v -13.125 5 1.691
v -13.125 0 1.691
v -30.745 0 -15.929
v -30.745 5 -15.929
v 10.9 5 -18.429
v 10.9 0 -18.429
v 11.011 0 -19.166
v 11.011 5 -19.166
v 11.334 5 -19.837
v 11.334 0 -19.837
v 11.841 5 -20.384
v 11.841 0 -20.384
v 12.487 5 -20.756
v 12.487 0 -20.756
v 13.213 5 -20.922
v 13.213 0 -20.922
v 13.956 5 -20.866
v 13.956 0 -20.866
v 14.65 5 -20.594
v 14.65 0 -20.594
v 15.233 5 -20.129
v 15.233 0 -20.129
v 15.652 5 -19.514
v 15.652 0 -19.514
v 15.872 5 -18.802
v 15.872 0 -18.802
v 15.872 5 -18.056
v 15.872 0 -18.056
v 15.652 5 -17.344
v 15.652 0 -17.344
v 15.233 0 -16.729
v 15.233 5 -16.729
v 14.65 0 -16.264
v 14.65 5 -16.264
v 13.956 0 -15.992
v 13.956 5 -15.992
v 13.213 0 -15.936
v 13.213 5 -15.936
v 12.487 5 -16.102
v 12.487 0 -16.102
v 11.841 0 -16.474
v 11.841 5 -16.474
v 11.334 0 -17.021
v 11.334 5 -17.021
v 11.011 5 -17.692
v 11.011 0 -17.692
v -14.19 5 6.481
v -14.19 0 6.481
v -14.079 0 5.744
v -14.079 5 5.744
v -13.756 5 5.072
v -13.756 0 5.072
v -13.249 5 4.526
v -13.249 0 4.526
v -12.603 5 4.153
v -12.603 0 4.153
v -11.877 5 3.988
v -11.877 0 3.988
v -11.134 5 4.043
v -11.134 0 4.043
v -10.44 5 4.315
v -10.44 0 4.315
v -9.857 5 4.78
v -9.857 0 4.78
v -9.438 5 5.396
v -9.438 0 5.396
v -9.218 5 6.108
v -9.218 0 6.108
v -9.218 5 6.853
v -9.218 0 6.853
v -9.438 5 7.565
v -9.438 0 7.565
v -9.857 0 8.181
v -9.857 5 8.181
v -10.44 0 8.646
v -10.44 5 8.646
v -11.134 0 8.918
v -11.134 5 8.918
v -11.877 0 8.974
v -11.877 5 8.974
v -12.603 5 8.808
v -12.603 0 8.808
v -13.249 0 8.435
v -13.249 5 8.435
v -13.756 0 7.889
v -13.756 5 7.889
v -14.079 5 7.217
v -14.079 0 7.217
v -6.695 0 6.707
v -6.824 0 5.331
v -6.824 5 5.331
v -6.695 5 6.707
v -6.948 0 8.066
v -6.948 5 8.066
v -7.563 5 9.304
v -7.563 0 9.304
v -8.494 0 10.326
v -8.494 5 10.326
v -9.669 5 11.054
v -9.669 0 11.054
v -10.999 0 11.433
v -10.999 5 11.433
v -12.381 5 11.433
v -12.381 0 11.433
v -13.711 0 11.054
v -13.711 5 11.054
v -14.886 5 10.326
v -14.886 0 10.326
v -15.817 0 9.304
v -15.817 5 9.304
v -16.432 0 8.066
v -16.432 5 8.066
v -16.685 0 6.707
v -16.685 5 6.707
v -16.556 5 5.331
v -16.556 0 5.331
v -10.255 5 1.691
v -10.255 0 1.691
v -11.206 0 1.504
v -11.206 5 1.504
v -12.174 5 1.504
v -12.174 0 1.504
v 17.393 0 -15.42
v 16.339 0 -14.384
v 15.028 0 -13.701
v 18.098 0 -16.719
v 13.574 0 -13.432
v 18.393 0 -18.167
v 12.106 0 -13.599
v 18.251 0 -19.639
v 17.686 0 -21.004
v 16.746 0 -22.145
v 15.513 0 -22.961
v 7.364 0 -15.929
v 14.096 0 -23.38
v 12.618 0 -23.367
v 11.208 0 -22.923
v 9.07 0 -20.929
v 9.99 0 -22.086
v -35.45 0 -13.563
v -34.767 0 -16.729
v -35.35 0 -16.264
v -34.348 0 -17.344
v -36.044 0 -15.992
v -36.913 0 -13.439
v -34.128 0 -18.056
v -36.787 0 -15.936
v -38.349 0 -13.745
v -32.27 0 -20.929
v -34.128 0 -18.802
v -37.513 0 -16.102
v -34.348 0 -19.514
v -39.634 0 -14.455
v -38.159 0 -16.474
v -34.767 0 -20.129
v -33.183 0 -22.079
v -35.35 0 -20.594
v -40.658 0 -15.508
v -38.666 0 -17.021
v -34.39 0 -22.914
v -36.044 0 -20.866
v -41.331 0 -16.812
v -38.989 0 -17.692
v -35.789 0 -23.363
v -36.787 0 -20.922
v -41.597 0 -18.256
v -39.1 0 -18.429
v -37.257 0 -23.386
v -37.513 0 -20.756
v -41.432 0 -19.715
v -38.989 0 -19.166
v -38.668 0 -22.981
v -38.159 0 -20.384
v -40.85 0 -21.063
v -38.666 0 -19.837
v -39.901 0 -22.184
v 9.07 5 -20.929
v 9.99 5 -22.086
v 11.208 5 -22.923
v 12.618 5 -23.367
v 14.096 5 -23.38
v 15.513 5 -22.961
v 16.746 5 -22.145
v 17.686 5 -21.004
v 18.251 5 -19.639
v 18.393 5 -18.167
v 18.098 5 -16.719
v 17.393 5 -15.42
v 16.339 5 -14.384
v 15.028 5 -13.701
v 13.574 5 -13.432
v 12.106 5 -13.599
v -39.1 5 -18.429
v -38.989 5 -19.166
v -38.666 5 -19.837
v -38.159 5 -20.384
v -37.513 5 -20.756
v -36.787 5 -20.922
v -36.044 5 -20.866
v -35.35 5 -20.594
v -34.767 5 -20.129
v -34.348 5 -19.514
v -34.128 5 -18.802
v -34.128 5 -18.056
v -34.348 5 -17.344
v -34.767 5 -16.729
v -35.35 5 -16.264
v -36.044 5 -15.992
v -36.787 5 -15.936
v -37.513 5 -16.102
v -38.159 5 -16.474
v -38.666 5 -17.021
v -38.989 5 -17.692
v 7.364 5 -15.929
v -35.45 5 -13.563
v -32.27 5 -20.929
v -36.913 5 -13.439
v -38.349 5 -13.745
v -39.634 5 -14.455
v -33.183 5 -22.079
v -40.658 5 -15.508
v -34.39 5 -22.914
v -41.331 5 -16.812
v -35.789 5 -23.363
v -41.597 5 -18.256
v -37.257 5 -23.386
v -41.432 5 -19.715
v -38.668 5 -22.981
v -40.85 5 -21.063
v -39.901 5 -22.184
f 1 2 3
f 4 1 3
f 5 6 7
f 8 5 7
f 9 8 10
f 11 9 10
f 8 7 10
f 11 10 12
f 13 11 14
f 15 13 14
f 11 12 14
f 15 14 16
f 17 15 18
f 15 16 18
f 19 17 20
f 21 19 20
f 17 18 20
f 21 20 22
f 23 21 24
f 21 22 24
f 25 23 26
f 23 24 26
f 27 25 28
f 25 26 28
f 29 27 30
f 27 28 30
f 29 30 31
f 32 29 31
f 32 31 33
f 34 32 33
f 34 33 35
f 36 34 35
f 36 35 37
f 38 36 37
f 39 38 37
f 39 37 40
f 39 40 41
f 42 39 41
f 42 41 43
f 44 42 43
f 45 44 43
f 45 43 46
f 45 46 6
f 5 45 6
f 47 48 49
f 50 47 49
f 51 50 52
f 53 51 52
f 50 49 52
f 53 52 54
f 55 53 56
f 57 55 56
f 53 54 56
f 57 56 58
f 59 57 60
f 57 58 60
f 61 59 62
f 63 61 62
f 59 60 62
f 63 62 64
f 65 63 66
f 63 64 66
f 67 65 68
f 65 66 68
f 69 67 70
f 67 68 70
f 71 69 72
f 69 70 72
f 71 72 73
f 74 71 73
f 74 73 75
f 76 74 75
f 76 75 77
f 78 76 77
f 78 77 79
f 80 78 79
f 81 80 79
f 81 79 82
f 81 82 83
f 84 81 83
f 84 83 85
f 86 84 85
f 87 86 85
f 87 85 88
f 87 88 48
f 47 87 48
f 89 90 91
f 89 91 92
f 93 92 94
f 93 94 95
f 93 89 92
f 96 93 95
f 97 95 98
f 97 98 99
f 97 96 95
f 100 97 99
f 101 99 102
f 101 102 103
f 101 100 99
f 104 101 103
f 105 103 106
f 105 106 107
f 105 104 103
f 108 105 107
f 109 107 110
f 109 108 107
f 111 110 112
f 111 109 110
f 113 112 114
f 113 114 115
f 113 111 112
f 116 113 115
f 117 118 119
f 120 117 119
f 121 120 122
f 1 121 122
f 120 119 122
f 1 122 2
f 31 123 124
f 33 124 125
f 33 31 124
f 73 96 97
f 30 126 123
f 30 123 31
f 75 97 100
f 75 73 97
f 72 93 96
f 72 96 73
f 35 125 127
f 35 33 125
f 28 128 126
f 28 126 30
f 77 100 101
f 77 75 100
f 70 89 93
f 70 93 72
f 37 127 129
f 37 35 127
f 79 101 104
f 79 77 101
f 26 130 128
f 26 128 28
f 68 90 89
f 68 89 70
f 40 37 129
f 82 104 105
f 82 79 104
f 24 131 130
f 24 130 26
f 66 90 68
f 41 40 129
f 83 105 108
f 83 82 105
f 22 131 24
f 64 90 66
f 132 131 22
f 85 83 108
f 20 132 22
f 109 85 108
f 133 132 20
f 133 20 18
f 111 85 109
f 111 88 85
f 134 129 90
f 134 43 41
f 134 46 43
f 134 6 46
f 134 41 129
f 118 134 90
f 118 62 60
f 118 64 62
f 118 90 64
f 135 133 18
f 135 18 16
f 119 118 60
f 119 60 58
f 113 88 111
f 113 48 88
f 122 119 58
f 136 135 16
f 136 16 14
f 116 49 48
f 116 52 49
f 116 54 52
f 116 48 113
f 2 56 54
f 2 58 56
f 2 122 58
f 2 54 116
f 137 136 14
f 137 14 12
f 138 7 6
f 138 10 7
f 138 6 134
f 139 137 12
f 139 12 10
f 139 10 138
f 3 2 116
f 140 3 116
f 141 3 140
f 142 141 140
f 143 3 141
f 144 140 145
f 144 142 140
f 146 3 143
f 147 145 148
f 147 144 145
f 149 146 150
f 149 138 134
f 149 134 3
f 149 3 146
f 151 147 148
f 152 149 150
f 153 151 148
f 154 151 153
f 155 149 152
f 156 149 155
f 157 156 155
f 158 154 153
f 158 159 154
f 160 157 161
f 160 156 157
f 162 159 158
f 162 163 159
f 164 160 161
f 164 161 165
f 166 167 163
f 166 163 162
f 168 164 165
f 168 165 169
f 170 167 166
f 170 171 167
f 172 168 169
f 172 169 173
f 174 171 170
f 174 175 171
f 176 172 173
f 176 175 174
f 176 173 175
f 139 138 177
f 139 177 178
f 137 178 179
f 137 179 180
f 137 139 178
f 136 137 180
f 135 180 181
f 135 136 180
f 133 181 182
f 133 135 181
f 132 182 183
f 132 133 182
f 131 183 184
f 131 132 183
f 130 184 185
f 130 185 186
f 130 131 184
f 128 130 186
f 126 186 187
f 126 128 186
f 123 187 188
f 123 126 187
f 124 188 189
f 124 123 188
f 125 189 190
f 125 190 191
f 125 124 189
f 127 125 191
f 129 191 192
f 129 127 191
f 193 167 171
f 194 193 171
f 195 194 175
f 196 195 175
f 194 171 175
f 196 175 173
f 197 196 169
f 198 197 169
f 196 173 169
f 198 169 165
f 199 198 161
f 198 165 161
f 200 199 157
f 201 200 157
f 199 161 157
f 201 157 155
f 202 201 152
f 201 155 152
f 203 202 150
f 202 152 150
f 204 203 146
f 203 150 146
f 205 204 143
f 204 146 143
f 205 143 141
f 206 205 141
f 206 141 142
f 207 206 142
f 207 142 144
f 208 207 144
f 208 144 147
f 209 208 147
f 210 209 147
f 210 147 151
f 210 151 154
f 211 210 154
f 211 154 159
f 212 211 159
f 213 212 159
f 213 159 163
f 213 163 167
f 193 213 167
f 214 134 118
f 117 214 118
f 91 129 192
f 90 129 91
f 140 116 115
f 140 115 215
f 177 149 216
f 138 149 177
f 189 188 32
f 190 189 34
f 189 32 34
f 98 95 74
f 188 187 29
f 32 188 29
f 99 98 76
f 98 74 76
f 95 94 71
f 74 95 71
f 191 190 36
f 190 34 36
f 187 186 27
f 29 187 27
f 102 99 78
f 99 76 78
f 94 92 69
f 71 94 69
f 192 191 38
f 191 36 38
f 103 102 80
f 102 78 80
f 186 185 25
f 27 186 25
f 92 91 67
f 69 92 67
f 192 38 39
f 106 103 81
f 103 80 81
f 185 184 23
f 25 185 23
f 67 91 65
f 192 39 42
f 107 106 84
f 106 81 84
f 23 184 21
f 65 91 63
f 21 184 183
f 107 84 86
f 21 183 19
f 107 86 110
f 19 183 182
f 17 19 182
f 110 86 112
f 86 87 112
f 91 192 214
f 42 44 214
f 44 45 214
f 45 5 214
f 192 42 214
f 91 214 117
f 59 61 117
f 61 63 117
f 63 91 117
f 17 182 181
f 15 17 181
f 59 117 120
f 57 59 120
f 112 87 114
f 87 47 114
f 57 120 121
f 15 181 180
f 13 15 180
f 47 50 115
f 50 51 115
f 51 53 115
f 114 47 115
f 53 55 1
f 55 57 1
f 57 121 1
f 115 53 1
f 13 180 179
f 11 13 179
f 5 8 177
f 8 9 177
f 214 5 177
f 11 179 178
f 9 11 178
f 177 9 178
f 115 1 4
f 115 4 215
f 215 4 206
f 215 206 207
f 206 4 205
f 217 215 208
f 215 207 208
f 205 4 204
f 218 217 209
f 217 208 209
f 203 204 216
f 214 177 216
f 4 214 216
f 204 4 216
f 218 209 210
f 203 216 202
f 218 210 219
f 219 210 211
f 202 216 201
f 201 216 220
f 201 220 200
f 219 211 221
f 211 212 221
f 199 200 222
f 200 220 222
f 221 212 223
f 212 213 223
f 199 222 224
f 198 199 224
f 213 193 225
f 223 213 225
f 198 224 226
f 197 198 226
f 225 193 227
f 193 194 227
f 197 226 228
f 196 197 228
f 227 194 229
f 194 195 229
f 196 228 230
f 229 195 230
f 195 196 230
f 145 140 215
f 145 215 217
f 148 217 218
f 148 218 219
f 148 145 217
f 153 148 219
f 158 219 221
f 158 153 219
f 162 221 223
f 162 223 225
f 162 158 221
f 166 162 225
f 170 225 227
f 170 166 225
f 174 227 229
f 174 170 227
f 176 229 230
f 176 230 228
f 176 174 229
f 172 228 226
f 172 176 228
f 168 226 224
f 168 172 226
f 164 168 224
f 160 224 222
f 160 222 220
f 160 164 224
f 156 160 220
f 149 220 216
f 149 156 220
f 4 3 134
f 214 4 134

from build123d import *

# Parameters (mm, degrees)
BOSS_EXTRUDE1_DEPTH   = 5
F_5_0MM_DOWEL_HOLE1_D = 5


with BuildPart() as part:
    # Sketch2 → Boss-Extrude1 (new body)
    with BuildSketch(Plane(origin=(0, 0, 0), x_dir=(1, 0, 0), z_dir=(0, 1, 0))):
        with BuildLine():
            Line((-32.269872981, 20.929032067), (9.069872981, 20.929032067))
            ThreePointArc((9.069872981, 20.929032067), (18.019397663, 20.342449229), (12.105904774, 13.599402936))
            Line((12.105904774, 13.599402936), (-6.82412184, -5.330623679))
            ThreePointArc((-6.82412184, -5.330623679), (-11.690092491, -11.4805496), (-16.556063141, -5.330623679))
            Line((-16.556063141, -5.330623679), (-35.449810526, 13.563123706))
            ThreePointArc((-35.449810526, 13.563123706), (-41.190492208, 20.410794235), (-32.269872981, 20.929032067))
        make_face()
        with BuildLine():
            Line((-30.744651075, 15.929032067), (7.364466094, 15.929032067))
            Line((7.364466094, 15.929032067), (-10.255377332, -1.690811359))
            ThreePointArc((-10.255377332, -1.690811359), (-11.690092491, -1.4805496), (-13.124807649, -1.690811359))
            Line((-13.124807649, -1.690811359), (-30.744651075, 15.929032067))
        make_face(mode=Mode.SUBTRACT)
    extrude(amount=BOSS_EXTRUDE1_DEPTH)

    # Ø5.0mm Dowel Hole1 (through all)
    with Locations(Plane(origin=(0, 5, 0), x_dir=(1, 0, 0), z_dir=(0, 1, 0))):
        with Locations((13.4, 18.429032067), (-36.6, 18.429032067), (-11.690092491, -6.4805496)):
            Hole(F_5_0MM_DOWEL_HOLE1_D / 2)


solid = part.part
